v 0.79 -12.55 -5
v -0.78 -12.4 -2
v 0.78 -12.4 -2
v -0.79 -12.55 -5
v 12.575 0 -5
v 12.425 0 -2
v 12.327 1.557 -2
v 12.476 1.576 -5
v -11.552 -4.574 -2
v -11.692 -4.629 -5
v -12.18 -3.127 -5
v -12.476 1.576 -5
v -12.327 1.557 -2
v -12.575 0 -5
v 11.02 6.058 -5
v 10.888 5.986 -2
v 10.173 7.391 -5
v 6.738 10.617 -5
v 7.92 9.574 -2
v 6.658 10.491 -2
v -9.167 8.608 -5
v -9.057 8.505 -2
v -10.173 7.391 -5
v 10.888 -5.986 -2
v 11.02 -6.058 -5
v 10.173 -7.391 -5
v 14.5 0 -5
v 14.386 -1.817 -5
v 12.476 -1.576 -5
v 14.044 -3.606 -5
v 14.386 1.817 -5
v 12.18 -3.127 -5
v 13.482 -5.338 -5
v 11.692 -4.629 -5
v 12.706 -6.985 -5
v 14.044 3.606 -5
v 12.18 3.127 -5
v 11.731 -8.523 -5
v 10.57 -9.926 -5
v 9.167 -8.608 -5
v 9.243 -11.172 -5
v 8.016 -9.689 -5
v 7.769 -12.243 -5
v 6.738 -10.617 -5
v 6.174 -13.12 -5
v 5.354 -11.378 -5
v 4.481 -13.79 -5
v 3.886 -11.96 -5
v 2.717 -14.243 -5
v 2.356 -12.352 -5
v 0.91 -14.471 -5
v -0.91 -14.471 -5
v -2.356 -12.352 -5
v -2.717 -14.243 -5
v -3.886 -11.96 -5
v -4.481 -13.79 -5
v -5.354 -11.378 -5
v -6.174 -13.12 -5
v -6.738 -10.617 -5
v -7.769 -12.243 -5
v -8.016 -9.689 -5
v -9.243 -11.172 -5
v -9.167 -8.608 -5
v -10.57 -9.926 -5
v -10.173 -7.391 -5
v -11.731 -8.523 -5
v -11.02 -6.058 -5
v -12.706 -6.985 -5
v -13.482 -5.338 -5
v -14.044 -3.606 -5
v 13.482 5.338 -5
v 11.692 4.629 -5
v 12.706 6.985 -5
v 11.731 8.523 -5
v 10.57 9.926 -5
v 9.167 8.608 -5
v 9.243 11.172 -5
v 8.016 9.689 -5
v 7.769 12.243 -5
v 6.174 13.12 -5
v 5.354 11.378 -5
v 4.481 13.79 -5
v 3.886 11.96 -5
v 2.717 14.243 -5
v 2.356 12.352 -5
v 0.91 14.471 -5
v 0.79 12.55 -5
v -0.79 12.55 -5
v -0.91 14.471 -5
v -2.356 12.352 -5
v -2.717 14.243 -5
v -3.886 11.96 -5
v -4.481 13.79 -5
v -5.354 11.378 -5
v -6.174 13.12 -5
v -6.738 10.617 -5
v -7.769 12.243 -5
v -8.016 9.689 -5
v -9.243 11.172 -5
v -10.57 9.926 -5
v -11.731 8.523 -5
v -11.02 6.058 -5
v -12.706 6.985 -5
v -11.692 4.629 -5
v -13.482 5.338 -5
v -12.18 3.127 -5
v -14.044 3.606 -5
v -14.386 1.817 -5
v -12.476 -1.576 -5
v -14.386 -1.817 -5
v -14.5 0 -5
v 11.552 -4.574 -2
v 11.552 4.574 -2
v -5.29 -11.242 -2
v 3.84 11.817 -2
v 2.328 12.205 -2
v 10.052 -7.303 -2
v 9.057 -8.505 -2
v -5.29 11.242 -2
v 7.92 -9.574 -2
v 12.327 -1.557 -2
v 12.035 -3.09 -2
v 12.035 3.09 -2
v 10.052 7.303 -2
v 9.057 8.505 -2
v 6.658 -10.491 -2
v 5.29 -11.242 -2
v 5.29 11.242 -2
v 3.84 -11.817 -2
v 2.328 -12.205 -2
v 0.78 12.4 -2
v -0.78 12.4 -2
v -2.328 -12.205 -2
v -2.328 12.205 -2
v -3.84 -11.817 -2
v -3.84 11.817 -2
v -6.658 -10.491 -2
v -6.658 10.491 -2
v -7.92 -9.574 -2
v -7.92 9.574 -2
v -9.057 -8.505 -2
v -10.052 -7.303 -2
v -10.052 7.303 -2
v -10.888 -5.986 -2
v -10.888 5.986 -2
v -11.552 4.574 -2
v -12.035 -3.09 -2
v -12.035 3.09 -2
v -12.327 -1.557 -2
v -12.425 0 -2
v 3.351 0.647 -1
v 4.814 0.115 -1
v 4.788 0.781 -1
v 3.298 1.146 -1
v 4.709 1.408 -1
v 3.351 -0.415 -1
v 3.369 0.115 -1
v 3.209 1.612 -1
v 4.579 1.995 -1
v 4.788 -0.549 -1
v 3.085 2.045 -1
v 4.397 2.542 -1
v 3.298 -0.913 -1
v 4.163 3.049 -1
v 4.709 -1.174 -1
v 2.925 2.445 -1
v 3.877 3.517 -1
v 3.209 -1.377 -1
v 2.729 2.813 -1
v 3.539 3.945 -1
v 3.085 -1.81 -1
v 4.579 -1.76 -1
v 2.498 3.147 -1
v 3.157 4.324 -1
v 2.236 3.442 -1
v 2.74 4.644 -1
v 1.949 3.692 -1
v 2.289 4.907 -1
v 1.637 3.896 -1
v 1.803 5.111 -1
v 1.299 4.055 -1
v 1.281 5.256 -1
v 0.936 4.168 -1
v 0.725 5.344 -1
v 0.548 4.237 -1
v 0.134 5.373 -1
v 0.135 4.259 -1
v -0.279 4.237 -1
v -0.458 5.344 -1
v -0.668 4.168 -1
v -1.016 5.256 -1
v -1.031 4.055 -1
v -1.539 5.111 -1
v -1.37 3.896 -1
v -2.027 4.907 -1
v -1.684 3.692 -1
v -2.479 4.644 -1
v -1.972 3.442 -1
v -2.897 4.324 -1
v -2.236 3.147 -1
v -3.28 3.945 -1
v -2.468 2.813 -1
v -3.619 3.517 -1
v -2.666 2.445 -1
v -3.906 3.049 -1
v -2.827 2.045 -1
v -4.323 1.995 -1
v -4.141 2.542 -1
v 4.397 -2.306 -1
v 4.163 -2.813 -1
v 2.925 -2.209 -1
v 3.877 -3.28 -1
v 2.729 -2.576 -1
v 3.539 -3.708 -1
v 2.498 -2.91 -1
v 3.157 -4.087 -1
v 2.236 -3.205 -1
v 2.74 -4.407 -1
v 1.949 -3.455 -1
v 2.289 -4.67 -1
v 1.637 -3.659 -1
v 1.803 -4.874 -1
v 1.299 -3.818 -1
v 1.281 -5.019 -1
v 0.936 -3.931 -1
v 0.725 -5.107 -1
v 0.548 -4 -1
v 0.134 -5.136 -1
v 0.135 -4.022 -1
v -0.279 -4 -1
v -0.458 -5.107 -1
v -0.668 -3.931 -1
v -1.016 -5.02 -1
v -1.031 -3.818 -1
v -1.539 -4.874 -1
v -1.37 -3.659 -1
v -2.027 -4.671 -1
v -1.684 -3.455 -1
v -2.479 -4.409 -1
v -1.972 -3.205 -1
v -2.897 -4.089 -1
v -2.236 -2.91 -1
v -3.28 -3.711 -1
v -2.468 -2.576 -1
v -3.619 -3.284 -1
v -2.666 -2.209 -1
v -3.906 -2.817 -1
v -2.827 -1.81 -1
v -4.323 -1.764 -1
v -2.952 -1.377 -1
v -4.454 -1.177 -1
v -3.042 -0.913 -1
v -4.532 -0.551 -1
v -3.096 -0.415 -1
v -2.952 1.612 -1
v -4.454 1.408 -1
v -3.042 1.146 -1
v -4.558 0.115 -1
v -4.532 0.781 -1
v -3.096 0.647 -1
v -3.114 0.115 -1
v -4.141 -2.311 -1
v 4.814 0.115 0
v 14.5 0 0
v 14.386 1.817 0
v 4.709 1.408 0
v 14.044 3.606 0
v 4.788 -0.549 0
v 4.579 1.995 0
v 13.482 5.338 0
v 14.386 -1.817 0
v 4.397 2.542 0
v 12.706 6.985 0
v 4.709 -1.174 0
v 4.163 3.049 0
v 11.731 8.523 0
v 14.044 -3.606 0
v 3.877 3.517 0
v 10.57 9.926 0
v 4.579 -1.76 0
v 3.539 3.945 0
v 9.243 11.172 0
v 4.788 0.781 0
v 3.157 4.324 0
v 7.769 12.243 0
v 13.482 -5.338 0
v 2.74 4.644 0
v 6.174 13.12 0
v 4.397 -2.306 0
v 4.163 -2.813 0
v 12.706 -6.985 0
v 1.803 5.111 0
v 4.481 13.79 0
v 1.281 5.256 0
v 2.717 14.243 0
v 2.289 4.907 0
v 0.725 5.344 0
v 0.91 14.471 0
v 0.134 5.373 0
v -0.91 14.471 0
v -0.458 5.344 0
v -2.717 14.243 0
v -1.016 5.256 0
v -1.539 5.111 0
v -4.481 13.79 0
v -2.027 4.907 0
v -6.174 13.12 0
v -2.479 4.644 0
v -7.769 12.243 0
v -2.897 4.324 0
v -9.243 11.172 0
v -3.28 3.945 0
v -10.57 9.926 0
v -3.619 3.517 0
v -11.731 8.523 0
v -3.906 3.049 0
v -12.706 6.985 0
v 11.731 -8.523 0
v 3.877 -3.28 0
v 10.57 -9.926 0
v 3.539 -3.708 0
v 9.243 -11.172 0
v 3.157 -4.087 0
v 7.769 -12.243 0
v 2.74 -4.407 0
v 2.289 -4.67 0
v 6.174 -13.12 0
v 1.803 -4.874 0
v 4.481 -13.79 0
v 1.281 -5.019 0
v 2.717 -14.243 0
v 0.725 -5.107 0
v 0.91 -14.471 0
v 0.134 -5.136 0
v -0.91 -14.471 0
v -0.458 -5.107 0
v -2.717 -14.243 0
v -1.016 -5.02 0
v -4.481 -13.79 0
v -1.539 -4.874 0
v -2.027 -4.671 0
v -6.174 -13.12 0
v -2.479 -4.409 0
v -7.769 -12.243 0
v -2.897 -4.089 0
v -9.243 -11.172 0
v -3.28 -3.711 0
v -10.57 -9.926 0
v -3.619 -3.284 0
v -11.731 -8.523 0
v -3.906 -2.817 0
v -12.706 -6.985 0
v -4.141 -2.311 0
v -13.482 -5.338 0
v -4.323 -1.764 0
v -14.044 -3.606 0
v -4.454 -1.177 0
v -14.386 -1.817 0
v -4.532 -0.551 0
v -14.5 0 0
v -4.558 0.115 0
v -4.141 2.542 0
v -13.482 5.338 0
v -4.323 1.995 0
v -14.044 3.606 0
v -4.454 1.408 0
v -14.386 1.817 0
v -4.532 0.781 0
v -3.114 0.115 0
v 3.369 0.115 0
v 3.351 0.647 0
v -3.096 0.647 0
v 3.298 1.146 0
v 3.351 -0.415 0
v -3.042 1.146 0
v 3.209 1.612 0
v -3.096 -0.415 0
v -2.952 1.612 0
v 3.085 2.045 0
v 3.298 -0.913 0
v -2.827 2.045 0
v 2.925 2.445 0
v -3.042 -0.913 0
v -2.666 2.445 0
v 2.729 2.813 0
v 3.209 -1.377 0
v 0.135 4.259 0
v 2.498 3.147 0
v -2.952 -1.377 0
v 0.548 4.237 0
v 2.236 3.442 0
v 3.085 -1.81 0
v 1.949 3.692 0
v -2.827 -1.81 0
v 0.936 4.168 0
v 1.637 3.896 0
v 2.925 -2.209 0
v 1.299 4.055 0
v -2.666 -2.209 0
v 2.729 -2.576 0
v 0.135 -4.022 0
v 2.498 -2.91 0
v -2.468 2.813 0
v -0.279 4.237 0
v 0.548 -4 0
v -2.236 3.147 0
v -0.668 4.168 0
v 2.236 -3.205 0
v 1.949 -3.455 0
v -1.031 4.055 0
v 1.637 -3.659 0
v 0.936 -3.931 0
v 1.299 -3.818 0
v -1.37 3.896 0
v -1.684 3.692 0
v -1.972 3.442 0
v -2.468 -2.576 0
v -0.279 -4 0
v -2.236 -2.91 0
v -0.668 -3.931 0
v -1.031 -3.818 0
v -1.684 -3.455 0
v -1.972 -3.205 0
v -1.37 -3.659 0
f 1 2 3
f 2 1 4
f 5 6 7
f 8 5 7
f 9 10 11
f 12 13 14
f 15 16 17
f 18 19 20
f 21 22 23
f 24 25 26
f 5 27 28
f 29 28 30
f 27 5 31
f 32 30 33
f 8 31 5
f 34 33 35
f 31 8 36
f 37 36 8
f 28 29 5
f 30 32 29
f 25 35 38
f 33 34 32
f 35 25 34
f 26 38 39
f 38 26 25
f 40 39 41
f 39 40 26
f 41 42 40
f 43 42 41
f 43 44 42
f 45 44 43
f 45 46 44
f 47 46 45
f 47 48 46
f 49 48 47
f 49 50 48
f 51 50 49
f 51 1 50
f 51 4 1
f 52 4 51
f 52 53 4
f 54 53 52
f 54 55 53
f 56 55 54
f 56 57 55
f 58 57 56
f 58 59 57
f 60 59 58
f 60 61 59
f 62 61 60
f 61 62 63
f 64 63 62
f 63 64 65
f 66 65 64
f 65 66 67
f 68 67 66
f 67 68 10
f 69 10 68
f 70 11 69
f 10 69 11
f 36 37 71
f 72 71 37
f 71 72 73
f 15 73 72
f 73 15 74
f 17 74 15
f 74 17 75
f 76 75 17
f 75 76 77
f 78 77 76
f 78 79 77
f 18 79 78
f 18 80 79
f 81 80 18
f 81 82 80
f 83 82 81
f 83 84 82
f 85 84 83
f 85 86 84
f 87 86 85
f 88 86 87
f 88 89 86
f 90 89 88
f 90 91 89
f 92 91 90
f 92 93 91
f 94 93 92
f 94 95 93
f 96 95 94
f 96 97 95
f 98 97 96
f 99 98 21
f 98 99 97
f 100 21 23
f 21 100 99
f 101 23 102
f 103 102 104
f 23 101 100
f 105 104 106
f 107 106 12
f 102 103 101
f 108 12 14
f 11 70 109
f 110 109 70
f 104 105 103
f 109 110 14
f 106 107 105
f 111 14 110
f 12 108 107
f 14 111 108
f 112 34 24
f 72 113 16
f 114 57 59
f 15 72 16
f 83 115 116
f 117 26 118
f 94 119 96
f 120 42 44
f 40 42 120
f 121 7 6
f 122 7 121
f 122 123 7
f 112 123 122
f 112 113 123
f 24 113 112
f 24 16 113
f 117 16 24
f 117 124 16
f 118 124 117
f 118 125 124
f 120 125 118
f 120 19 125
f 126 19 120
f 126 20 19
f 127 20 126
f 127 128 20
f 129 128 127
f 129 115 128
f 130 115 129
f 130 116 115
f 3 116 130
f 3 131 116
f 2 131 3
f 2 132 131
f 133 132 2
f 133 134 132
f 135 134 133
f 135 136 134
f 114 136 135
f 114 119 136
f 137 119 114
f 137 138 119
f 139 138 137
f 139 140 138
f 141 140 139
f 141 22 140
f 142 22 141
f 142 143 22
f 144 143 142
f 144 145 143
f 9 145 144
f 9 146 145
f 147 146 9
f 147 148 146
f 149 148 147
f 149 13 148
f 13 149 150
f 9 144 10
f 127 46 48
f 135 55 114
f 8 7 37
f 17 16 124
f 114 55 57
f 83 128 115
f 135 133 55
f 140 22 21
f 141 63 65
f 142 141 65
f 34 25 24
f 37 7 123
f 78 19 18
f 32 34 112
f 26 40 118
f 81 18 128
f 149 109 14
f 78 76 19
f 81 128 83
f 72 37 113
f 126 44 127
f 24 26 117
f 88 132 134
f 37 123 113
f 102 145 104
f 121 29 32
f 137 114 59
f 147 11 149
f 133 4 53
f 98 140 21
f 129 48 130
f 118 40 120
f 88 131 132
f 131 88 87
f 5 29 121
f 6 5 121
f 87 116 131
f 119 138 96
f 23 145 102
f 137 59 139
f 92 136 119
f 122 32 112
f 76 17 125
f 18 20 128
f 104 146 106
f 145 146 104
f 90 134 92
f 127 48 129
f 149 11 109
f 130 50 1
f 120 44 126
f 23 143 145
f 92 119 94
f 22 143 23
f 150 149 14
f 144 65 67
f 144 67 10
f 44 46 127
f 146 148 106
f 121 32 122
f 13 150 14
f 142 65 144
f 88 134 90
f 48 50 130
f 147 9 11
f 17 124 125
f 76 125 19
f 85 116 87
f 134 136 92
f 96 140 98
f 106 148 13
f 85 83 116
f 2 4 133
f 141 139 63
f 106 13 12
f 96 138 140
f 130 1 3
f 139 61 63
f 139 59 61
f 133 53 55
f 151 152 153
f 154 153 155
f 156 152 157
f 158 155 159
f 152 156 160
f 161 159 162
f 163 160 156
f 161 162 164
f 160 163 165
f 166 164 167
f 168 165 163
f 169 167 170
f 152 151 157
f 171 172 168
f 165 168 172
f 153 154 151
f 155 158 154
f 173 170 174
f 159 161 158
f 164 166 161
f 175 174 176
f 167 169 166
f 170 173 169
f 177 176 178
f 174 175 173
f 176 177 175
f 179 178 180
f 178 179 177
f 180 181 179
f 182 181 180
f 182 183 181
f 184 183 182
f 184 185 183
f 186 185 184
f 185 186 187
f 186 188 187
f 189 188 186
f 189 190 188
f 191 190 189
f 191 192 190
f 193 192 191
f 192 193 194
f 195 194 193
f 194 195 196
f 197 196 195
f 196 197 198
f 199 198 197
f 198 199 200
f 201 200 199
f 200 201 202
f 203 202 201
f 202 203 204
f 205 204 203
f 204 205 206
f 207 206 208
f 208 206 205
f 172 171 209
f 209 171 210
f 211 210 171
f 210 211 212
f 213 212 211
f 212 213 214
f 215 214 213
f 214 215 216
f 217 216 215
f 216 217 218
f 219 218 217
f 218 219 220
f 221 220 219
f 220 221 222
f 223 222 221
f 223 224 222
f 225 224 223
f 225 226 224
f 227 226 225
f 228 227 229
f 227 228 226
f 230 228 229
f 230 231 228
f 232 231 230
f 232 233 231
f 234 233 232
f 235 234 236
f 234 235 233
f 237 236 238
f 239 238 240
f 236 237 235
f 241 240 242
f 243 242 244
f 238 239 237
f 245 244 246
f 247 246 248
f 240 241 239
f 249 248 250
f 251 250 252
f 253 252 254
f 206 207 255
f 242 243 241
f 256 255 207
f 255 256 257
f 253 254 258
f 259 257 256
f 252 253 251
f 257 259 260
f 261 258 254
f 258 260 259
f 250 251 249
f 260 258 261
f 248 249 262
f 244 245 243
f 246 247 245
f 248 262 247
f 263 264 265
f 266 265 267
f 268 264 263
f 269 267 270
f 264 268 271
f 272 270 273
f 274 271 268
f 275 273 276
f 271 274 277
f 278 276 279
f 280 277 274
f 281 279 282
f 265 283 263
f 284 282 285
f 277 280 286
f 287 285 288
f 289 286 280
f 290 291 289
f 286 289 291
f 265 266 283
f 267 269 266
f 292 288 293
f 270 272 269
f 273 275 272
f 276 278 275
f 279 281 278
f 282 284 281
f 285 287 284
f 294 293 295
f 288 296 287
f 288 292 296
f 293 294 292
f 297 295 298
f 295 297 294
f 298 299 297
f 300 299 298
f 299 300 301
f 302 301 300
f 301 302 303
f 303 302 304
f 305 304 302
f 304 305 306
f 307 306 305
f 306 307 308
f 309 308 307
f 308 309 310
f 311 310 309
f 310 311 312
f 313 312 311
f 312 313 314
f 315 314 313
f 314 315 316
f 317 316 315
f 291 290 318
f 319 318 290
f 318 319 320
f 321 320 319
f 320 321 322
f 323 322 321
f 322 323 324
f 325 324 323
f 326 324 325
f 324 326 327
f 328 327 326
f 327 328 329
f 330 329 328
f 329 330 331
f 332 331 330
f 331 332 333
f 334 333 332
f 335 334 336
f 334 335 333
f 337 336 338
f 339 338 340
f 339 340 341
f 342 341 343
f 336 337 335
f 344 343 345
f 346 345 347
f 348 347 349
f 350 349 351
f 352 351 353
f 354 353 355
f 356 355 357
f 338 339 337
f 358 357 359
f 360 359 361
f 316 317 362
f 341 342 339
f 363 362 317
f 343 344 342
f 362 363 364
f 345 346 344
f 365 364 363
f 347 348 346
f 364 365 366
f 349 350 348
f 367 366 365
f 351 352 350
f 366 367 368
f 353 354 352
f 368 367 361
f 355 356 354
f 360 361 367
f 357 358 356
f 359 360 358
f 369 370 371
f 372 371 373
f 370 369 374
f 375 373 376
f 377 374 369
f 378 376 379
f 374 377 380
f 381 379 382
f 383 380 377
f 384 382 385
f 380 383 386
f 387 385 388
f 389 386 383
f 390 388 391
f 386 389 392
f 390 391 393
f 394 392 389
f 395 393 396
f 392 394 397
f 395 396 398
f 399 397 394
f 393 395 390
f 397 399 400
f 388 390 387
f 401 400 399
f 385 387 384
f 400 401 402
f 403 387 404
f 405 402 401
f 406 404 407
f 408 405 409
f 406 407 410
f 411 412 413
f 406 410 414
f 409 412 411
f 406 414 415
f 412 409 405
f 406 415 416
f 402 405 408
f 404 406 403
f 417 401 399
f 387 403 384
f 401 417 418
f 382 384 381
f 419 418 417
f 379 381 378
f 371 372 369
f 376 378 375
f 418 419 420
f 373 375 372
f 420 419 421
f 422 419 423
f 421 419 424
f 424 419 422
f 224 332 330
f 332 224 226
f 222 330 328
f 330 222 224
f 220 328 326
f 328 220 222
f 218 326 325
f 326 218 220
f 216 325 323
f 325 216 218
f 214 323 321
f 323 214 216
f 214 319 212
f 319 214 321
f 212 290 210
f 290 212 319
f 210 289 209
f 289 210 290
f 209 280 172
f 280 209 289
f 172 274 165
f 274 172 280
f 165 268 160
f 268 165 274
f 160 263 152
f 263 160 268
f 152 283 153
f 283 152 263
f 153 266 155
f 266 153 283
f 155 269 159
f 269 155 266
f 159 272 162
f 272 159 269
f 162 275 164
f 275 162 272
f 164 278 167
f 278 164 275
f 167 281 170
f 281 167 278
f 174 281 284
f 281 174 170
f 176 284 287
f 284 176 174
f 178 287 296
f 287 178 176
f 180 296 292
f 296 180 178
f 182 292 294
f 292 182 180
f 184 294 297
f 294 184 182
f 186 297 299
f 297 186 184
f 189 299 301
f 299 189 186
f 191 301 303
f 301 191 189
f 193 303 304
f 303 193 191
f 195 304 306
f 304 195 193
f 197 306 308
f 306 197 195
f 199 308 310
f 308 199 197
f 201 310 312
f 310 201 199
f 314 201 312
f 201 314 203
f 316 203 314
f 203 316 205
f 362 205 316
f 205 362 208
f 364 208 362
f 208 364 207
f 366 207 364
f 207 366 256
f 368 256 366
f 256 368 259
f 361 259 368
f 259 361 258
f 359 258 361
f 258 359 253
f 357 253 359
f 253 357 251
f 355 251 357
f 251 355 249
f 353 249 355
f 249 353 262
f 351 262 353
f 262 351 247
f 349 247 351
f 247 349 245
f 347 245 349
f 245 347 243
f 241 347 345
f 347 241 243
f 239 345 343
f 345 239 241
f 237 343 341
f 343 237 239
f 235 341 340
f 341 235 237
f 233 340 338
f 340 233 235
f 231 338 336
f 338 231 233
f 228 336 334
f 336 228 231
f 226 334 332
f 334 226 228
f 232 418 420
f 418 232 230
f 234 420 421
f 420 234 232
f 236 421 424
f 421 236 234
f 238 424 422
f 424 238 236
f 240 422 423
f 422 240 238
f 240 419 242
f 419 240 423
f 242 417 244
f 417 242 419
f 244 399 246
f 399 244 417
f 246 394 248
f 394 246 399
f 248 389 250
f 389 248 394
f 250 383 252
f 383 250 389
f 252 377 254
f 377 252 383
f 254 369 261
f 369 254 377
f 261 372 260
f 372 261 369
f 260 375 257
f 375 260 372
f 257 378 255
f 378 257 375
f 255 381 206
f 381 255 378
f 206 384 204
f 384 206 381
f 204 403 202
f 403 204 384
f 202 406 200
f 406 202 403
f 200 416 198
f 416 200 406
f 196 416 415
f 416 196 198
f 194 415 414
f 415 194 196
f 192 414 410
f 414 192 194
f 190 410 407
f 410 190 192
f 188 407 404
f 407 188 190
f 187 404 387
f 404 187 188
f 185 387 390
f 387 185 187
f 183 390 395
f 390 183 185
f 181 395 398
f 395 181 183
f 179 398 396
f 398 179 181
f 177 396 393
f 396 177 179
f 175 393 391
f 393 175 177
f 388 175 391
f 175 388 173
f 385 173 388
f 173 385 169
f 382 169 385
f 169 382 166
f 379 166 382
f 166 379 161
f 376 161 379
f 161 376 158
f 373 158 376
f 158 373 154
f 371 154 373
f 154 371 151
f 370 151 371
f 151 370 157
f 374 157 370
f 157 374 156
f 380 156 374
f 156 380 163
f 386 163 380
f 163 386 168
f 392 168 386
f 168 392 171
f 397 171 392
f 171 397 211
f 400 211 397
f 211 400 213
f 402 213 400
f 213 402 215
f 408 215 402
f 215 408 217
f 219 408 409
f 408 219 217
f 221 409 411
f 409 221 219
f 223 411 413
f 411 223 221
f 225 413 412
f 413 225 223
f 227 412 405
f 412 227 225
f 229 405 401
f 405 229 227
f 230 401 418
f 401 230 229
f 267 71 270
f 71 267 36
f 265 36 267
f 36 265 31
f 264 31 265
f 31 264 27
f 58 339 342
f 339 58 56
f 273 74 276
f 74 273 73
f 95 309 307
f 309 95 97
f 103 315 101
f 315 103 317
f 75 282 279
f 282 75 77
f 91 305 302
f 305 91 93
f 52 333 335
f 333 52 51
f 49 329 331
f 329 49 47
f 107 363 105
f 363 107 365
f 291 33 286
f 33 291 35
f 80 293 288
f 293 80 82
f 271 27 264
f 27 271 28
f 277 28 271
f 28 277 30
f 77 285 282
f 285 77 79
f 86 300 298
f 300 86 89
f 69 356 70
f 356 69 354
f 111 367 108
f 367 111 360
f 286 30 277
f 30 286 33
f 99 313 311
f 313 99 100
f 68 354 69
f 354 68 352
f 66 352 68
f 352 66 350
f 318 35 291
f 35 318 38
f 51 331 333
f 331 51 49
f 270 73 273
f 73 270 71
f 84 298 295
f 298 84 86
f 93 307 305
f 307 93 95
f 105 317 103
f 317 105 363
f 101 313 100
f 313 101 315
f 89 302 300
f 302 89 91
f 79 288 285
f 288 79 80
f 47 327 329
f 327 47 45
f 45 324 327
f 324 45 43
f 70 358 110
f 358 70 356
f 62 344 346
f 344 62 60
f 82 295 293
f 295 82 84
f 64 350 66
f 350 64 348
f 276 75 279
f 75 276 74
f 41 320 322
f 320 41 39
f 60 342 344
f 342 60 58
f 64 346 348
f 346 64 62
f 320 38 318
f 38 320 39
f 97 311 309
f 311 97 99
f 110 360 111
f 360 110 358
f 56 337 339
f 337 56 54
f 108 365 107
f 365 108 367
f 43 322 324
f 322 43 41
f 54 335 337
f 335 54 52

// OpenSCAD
$fn = 50;

difference() {
	union() {
		translate(v = [0, 0, -5.0]) {
			cylinder(h = 5, r = 14.5);
		}
	}
	union() {
		#translate(v = [0, 0, -5.0]) {
			cylinder(h = 3, r1 = 12.575, r2 = 12.425);
		}
		translate(v = [0, 0, -1]) {
			linear_extrude(height = 1) {
				text(font = "Impact", halign = "center", size = 10, text = "O", valign = "center");
			}
		}
	}
}
